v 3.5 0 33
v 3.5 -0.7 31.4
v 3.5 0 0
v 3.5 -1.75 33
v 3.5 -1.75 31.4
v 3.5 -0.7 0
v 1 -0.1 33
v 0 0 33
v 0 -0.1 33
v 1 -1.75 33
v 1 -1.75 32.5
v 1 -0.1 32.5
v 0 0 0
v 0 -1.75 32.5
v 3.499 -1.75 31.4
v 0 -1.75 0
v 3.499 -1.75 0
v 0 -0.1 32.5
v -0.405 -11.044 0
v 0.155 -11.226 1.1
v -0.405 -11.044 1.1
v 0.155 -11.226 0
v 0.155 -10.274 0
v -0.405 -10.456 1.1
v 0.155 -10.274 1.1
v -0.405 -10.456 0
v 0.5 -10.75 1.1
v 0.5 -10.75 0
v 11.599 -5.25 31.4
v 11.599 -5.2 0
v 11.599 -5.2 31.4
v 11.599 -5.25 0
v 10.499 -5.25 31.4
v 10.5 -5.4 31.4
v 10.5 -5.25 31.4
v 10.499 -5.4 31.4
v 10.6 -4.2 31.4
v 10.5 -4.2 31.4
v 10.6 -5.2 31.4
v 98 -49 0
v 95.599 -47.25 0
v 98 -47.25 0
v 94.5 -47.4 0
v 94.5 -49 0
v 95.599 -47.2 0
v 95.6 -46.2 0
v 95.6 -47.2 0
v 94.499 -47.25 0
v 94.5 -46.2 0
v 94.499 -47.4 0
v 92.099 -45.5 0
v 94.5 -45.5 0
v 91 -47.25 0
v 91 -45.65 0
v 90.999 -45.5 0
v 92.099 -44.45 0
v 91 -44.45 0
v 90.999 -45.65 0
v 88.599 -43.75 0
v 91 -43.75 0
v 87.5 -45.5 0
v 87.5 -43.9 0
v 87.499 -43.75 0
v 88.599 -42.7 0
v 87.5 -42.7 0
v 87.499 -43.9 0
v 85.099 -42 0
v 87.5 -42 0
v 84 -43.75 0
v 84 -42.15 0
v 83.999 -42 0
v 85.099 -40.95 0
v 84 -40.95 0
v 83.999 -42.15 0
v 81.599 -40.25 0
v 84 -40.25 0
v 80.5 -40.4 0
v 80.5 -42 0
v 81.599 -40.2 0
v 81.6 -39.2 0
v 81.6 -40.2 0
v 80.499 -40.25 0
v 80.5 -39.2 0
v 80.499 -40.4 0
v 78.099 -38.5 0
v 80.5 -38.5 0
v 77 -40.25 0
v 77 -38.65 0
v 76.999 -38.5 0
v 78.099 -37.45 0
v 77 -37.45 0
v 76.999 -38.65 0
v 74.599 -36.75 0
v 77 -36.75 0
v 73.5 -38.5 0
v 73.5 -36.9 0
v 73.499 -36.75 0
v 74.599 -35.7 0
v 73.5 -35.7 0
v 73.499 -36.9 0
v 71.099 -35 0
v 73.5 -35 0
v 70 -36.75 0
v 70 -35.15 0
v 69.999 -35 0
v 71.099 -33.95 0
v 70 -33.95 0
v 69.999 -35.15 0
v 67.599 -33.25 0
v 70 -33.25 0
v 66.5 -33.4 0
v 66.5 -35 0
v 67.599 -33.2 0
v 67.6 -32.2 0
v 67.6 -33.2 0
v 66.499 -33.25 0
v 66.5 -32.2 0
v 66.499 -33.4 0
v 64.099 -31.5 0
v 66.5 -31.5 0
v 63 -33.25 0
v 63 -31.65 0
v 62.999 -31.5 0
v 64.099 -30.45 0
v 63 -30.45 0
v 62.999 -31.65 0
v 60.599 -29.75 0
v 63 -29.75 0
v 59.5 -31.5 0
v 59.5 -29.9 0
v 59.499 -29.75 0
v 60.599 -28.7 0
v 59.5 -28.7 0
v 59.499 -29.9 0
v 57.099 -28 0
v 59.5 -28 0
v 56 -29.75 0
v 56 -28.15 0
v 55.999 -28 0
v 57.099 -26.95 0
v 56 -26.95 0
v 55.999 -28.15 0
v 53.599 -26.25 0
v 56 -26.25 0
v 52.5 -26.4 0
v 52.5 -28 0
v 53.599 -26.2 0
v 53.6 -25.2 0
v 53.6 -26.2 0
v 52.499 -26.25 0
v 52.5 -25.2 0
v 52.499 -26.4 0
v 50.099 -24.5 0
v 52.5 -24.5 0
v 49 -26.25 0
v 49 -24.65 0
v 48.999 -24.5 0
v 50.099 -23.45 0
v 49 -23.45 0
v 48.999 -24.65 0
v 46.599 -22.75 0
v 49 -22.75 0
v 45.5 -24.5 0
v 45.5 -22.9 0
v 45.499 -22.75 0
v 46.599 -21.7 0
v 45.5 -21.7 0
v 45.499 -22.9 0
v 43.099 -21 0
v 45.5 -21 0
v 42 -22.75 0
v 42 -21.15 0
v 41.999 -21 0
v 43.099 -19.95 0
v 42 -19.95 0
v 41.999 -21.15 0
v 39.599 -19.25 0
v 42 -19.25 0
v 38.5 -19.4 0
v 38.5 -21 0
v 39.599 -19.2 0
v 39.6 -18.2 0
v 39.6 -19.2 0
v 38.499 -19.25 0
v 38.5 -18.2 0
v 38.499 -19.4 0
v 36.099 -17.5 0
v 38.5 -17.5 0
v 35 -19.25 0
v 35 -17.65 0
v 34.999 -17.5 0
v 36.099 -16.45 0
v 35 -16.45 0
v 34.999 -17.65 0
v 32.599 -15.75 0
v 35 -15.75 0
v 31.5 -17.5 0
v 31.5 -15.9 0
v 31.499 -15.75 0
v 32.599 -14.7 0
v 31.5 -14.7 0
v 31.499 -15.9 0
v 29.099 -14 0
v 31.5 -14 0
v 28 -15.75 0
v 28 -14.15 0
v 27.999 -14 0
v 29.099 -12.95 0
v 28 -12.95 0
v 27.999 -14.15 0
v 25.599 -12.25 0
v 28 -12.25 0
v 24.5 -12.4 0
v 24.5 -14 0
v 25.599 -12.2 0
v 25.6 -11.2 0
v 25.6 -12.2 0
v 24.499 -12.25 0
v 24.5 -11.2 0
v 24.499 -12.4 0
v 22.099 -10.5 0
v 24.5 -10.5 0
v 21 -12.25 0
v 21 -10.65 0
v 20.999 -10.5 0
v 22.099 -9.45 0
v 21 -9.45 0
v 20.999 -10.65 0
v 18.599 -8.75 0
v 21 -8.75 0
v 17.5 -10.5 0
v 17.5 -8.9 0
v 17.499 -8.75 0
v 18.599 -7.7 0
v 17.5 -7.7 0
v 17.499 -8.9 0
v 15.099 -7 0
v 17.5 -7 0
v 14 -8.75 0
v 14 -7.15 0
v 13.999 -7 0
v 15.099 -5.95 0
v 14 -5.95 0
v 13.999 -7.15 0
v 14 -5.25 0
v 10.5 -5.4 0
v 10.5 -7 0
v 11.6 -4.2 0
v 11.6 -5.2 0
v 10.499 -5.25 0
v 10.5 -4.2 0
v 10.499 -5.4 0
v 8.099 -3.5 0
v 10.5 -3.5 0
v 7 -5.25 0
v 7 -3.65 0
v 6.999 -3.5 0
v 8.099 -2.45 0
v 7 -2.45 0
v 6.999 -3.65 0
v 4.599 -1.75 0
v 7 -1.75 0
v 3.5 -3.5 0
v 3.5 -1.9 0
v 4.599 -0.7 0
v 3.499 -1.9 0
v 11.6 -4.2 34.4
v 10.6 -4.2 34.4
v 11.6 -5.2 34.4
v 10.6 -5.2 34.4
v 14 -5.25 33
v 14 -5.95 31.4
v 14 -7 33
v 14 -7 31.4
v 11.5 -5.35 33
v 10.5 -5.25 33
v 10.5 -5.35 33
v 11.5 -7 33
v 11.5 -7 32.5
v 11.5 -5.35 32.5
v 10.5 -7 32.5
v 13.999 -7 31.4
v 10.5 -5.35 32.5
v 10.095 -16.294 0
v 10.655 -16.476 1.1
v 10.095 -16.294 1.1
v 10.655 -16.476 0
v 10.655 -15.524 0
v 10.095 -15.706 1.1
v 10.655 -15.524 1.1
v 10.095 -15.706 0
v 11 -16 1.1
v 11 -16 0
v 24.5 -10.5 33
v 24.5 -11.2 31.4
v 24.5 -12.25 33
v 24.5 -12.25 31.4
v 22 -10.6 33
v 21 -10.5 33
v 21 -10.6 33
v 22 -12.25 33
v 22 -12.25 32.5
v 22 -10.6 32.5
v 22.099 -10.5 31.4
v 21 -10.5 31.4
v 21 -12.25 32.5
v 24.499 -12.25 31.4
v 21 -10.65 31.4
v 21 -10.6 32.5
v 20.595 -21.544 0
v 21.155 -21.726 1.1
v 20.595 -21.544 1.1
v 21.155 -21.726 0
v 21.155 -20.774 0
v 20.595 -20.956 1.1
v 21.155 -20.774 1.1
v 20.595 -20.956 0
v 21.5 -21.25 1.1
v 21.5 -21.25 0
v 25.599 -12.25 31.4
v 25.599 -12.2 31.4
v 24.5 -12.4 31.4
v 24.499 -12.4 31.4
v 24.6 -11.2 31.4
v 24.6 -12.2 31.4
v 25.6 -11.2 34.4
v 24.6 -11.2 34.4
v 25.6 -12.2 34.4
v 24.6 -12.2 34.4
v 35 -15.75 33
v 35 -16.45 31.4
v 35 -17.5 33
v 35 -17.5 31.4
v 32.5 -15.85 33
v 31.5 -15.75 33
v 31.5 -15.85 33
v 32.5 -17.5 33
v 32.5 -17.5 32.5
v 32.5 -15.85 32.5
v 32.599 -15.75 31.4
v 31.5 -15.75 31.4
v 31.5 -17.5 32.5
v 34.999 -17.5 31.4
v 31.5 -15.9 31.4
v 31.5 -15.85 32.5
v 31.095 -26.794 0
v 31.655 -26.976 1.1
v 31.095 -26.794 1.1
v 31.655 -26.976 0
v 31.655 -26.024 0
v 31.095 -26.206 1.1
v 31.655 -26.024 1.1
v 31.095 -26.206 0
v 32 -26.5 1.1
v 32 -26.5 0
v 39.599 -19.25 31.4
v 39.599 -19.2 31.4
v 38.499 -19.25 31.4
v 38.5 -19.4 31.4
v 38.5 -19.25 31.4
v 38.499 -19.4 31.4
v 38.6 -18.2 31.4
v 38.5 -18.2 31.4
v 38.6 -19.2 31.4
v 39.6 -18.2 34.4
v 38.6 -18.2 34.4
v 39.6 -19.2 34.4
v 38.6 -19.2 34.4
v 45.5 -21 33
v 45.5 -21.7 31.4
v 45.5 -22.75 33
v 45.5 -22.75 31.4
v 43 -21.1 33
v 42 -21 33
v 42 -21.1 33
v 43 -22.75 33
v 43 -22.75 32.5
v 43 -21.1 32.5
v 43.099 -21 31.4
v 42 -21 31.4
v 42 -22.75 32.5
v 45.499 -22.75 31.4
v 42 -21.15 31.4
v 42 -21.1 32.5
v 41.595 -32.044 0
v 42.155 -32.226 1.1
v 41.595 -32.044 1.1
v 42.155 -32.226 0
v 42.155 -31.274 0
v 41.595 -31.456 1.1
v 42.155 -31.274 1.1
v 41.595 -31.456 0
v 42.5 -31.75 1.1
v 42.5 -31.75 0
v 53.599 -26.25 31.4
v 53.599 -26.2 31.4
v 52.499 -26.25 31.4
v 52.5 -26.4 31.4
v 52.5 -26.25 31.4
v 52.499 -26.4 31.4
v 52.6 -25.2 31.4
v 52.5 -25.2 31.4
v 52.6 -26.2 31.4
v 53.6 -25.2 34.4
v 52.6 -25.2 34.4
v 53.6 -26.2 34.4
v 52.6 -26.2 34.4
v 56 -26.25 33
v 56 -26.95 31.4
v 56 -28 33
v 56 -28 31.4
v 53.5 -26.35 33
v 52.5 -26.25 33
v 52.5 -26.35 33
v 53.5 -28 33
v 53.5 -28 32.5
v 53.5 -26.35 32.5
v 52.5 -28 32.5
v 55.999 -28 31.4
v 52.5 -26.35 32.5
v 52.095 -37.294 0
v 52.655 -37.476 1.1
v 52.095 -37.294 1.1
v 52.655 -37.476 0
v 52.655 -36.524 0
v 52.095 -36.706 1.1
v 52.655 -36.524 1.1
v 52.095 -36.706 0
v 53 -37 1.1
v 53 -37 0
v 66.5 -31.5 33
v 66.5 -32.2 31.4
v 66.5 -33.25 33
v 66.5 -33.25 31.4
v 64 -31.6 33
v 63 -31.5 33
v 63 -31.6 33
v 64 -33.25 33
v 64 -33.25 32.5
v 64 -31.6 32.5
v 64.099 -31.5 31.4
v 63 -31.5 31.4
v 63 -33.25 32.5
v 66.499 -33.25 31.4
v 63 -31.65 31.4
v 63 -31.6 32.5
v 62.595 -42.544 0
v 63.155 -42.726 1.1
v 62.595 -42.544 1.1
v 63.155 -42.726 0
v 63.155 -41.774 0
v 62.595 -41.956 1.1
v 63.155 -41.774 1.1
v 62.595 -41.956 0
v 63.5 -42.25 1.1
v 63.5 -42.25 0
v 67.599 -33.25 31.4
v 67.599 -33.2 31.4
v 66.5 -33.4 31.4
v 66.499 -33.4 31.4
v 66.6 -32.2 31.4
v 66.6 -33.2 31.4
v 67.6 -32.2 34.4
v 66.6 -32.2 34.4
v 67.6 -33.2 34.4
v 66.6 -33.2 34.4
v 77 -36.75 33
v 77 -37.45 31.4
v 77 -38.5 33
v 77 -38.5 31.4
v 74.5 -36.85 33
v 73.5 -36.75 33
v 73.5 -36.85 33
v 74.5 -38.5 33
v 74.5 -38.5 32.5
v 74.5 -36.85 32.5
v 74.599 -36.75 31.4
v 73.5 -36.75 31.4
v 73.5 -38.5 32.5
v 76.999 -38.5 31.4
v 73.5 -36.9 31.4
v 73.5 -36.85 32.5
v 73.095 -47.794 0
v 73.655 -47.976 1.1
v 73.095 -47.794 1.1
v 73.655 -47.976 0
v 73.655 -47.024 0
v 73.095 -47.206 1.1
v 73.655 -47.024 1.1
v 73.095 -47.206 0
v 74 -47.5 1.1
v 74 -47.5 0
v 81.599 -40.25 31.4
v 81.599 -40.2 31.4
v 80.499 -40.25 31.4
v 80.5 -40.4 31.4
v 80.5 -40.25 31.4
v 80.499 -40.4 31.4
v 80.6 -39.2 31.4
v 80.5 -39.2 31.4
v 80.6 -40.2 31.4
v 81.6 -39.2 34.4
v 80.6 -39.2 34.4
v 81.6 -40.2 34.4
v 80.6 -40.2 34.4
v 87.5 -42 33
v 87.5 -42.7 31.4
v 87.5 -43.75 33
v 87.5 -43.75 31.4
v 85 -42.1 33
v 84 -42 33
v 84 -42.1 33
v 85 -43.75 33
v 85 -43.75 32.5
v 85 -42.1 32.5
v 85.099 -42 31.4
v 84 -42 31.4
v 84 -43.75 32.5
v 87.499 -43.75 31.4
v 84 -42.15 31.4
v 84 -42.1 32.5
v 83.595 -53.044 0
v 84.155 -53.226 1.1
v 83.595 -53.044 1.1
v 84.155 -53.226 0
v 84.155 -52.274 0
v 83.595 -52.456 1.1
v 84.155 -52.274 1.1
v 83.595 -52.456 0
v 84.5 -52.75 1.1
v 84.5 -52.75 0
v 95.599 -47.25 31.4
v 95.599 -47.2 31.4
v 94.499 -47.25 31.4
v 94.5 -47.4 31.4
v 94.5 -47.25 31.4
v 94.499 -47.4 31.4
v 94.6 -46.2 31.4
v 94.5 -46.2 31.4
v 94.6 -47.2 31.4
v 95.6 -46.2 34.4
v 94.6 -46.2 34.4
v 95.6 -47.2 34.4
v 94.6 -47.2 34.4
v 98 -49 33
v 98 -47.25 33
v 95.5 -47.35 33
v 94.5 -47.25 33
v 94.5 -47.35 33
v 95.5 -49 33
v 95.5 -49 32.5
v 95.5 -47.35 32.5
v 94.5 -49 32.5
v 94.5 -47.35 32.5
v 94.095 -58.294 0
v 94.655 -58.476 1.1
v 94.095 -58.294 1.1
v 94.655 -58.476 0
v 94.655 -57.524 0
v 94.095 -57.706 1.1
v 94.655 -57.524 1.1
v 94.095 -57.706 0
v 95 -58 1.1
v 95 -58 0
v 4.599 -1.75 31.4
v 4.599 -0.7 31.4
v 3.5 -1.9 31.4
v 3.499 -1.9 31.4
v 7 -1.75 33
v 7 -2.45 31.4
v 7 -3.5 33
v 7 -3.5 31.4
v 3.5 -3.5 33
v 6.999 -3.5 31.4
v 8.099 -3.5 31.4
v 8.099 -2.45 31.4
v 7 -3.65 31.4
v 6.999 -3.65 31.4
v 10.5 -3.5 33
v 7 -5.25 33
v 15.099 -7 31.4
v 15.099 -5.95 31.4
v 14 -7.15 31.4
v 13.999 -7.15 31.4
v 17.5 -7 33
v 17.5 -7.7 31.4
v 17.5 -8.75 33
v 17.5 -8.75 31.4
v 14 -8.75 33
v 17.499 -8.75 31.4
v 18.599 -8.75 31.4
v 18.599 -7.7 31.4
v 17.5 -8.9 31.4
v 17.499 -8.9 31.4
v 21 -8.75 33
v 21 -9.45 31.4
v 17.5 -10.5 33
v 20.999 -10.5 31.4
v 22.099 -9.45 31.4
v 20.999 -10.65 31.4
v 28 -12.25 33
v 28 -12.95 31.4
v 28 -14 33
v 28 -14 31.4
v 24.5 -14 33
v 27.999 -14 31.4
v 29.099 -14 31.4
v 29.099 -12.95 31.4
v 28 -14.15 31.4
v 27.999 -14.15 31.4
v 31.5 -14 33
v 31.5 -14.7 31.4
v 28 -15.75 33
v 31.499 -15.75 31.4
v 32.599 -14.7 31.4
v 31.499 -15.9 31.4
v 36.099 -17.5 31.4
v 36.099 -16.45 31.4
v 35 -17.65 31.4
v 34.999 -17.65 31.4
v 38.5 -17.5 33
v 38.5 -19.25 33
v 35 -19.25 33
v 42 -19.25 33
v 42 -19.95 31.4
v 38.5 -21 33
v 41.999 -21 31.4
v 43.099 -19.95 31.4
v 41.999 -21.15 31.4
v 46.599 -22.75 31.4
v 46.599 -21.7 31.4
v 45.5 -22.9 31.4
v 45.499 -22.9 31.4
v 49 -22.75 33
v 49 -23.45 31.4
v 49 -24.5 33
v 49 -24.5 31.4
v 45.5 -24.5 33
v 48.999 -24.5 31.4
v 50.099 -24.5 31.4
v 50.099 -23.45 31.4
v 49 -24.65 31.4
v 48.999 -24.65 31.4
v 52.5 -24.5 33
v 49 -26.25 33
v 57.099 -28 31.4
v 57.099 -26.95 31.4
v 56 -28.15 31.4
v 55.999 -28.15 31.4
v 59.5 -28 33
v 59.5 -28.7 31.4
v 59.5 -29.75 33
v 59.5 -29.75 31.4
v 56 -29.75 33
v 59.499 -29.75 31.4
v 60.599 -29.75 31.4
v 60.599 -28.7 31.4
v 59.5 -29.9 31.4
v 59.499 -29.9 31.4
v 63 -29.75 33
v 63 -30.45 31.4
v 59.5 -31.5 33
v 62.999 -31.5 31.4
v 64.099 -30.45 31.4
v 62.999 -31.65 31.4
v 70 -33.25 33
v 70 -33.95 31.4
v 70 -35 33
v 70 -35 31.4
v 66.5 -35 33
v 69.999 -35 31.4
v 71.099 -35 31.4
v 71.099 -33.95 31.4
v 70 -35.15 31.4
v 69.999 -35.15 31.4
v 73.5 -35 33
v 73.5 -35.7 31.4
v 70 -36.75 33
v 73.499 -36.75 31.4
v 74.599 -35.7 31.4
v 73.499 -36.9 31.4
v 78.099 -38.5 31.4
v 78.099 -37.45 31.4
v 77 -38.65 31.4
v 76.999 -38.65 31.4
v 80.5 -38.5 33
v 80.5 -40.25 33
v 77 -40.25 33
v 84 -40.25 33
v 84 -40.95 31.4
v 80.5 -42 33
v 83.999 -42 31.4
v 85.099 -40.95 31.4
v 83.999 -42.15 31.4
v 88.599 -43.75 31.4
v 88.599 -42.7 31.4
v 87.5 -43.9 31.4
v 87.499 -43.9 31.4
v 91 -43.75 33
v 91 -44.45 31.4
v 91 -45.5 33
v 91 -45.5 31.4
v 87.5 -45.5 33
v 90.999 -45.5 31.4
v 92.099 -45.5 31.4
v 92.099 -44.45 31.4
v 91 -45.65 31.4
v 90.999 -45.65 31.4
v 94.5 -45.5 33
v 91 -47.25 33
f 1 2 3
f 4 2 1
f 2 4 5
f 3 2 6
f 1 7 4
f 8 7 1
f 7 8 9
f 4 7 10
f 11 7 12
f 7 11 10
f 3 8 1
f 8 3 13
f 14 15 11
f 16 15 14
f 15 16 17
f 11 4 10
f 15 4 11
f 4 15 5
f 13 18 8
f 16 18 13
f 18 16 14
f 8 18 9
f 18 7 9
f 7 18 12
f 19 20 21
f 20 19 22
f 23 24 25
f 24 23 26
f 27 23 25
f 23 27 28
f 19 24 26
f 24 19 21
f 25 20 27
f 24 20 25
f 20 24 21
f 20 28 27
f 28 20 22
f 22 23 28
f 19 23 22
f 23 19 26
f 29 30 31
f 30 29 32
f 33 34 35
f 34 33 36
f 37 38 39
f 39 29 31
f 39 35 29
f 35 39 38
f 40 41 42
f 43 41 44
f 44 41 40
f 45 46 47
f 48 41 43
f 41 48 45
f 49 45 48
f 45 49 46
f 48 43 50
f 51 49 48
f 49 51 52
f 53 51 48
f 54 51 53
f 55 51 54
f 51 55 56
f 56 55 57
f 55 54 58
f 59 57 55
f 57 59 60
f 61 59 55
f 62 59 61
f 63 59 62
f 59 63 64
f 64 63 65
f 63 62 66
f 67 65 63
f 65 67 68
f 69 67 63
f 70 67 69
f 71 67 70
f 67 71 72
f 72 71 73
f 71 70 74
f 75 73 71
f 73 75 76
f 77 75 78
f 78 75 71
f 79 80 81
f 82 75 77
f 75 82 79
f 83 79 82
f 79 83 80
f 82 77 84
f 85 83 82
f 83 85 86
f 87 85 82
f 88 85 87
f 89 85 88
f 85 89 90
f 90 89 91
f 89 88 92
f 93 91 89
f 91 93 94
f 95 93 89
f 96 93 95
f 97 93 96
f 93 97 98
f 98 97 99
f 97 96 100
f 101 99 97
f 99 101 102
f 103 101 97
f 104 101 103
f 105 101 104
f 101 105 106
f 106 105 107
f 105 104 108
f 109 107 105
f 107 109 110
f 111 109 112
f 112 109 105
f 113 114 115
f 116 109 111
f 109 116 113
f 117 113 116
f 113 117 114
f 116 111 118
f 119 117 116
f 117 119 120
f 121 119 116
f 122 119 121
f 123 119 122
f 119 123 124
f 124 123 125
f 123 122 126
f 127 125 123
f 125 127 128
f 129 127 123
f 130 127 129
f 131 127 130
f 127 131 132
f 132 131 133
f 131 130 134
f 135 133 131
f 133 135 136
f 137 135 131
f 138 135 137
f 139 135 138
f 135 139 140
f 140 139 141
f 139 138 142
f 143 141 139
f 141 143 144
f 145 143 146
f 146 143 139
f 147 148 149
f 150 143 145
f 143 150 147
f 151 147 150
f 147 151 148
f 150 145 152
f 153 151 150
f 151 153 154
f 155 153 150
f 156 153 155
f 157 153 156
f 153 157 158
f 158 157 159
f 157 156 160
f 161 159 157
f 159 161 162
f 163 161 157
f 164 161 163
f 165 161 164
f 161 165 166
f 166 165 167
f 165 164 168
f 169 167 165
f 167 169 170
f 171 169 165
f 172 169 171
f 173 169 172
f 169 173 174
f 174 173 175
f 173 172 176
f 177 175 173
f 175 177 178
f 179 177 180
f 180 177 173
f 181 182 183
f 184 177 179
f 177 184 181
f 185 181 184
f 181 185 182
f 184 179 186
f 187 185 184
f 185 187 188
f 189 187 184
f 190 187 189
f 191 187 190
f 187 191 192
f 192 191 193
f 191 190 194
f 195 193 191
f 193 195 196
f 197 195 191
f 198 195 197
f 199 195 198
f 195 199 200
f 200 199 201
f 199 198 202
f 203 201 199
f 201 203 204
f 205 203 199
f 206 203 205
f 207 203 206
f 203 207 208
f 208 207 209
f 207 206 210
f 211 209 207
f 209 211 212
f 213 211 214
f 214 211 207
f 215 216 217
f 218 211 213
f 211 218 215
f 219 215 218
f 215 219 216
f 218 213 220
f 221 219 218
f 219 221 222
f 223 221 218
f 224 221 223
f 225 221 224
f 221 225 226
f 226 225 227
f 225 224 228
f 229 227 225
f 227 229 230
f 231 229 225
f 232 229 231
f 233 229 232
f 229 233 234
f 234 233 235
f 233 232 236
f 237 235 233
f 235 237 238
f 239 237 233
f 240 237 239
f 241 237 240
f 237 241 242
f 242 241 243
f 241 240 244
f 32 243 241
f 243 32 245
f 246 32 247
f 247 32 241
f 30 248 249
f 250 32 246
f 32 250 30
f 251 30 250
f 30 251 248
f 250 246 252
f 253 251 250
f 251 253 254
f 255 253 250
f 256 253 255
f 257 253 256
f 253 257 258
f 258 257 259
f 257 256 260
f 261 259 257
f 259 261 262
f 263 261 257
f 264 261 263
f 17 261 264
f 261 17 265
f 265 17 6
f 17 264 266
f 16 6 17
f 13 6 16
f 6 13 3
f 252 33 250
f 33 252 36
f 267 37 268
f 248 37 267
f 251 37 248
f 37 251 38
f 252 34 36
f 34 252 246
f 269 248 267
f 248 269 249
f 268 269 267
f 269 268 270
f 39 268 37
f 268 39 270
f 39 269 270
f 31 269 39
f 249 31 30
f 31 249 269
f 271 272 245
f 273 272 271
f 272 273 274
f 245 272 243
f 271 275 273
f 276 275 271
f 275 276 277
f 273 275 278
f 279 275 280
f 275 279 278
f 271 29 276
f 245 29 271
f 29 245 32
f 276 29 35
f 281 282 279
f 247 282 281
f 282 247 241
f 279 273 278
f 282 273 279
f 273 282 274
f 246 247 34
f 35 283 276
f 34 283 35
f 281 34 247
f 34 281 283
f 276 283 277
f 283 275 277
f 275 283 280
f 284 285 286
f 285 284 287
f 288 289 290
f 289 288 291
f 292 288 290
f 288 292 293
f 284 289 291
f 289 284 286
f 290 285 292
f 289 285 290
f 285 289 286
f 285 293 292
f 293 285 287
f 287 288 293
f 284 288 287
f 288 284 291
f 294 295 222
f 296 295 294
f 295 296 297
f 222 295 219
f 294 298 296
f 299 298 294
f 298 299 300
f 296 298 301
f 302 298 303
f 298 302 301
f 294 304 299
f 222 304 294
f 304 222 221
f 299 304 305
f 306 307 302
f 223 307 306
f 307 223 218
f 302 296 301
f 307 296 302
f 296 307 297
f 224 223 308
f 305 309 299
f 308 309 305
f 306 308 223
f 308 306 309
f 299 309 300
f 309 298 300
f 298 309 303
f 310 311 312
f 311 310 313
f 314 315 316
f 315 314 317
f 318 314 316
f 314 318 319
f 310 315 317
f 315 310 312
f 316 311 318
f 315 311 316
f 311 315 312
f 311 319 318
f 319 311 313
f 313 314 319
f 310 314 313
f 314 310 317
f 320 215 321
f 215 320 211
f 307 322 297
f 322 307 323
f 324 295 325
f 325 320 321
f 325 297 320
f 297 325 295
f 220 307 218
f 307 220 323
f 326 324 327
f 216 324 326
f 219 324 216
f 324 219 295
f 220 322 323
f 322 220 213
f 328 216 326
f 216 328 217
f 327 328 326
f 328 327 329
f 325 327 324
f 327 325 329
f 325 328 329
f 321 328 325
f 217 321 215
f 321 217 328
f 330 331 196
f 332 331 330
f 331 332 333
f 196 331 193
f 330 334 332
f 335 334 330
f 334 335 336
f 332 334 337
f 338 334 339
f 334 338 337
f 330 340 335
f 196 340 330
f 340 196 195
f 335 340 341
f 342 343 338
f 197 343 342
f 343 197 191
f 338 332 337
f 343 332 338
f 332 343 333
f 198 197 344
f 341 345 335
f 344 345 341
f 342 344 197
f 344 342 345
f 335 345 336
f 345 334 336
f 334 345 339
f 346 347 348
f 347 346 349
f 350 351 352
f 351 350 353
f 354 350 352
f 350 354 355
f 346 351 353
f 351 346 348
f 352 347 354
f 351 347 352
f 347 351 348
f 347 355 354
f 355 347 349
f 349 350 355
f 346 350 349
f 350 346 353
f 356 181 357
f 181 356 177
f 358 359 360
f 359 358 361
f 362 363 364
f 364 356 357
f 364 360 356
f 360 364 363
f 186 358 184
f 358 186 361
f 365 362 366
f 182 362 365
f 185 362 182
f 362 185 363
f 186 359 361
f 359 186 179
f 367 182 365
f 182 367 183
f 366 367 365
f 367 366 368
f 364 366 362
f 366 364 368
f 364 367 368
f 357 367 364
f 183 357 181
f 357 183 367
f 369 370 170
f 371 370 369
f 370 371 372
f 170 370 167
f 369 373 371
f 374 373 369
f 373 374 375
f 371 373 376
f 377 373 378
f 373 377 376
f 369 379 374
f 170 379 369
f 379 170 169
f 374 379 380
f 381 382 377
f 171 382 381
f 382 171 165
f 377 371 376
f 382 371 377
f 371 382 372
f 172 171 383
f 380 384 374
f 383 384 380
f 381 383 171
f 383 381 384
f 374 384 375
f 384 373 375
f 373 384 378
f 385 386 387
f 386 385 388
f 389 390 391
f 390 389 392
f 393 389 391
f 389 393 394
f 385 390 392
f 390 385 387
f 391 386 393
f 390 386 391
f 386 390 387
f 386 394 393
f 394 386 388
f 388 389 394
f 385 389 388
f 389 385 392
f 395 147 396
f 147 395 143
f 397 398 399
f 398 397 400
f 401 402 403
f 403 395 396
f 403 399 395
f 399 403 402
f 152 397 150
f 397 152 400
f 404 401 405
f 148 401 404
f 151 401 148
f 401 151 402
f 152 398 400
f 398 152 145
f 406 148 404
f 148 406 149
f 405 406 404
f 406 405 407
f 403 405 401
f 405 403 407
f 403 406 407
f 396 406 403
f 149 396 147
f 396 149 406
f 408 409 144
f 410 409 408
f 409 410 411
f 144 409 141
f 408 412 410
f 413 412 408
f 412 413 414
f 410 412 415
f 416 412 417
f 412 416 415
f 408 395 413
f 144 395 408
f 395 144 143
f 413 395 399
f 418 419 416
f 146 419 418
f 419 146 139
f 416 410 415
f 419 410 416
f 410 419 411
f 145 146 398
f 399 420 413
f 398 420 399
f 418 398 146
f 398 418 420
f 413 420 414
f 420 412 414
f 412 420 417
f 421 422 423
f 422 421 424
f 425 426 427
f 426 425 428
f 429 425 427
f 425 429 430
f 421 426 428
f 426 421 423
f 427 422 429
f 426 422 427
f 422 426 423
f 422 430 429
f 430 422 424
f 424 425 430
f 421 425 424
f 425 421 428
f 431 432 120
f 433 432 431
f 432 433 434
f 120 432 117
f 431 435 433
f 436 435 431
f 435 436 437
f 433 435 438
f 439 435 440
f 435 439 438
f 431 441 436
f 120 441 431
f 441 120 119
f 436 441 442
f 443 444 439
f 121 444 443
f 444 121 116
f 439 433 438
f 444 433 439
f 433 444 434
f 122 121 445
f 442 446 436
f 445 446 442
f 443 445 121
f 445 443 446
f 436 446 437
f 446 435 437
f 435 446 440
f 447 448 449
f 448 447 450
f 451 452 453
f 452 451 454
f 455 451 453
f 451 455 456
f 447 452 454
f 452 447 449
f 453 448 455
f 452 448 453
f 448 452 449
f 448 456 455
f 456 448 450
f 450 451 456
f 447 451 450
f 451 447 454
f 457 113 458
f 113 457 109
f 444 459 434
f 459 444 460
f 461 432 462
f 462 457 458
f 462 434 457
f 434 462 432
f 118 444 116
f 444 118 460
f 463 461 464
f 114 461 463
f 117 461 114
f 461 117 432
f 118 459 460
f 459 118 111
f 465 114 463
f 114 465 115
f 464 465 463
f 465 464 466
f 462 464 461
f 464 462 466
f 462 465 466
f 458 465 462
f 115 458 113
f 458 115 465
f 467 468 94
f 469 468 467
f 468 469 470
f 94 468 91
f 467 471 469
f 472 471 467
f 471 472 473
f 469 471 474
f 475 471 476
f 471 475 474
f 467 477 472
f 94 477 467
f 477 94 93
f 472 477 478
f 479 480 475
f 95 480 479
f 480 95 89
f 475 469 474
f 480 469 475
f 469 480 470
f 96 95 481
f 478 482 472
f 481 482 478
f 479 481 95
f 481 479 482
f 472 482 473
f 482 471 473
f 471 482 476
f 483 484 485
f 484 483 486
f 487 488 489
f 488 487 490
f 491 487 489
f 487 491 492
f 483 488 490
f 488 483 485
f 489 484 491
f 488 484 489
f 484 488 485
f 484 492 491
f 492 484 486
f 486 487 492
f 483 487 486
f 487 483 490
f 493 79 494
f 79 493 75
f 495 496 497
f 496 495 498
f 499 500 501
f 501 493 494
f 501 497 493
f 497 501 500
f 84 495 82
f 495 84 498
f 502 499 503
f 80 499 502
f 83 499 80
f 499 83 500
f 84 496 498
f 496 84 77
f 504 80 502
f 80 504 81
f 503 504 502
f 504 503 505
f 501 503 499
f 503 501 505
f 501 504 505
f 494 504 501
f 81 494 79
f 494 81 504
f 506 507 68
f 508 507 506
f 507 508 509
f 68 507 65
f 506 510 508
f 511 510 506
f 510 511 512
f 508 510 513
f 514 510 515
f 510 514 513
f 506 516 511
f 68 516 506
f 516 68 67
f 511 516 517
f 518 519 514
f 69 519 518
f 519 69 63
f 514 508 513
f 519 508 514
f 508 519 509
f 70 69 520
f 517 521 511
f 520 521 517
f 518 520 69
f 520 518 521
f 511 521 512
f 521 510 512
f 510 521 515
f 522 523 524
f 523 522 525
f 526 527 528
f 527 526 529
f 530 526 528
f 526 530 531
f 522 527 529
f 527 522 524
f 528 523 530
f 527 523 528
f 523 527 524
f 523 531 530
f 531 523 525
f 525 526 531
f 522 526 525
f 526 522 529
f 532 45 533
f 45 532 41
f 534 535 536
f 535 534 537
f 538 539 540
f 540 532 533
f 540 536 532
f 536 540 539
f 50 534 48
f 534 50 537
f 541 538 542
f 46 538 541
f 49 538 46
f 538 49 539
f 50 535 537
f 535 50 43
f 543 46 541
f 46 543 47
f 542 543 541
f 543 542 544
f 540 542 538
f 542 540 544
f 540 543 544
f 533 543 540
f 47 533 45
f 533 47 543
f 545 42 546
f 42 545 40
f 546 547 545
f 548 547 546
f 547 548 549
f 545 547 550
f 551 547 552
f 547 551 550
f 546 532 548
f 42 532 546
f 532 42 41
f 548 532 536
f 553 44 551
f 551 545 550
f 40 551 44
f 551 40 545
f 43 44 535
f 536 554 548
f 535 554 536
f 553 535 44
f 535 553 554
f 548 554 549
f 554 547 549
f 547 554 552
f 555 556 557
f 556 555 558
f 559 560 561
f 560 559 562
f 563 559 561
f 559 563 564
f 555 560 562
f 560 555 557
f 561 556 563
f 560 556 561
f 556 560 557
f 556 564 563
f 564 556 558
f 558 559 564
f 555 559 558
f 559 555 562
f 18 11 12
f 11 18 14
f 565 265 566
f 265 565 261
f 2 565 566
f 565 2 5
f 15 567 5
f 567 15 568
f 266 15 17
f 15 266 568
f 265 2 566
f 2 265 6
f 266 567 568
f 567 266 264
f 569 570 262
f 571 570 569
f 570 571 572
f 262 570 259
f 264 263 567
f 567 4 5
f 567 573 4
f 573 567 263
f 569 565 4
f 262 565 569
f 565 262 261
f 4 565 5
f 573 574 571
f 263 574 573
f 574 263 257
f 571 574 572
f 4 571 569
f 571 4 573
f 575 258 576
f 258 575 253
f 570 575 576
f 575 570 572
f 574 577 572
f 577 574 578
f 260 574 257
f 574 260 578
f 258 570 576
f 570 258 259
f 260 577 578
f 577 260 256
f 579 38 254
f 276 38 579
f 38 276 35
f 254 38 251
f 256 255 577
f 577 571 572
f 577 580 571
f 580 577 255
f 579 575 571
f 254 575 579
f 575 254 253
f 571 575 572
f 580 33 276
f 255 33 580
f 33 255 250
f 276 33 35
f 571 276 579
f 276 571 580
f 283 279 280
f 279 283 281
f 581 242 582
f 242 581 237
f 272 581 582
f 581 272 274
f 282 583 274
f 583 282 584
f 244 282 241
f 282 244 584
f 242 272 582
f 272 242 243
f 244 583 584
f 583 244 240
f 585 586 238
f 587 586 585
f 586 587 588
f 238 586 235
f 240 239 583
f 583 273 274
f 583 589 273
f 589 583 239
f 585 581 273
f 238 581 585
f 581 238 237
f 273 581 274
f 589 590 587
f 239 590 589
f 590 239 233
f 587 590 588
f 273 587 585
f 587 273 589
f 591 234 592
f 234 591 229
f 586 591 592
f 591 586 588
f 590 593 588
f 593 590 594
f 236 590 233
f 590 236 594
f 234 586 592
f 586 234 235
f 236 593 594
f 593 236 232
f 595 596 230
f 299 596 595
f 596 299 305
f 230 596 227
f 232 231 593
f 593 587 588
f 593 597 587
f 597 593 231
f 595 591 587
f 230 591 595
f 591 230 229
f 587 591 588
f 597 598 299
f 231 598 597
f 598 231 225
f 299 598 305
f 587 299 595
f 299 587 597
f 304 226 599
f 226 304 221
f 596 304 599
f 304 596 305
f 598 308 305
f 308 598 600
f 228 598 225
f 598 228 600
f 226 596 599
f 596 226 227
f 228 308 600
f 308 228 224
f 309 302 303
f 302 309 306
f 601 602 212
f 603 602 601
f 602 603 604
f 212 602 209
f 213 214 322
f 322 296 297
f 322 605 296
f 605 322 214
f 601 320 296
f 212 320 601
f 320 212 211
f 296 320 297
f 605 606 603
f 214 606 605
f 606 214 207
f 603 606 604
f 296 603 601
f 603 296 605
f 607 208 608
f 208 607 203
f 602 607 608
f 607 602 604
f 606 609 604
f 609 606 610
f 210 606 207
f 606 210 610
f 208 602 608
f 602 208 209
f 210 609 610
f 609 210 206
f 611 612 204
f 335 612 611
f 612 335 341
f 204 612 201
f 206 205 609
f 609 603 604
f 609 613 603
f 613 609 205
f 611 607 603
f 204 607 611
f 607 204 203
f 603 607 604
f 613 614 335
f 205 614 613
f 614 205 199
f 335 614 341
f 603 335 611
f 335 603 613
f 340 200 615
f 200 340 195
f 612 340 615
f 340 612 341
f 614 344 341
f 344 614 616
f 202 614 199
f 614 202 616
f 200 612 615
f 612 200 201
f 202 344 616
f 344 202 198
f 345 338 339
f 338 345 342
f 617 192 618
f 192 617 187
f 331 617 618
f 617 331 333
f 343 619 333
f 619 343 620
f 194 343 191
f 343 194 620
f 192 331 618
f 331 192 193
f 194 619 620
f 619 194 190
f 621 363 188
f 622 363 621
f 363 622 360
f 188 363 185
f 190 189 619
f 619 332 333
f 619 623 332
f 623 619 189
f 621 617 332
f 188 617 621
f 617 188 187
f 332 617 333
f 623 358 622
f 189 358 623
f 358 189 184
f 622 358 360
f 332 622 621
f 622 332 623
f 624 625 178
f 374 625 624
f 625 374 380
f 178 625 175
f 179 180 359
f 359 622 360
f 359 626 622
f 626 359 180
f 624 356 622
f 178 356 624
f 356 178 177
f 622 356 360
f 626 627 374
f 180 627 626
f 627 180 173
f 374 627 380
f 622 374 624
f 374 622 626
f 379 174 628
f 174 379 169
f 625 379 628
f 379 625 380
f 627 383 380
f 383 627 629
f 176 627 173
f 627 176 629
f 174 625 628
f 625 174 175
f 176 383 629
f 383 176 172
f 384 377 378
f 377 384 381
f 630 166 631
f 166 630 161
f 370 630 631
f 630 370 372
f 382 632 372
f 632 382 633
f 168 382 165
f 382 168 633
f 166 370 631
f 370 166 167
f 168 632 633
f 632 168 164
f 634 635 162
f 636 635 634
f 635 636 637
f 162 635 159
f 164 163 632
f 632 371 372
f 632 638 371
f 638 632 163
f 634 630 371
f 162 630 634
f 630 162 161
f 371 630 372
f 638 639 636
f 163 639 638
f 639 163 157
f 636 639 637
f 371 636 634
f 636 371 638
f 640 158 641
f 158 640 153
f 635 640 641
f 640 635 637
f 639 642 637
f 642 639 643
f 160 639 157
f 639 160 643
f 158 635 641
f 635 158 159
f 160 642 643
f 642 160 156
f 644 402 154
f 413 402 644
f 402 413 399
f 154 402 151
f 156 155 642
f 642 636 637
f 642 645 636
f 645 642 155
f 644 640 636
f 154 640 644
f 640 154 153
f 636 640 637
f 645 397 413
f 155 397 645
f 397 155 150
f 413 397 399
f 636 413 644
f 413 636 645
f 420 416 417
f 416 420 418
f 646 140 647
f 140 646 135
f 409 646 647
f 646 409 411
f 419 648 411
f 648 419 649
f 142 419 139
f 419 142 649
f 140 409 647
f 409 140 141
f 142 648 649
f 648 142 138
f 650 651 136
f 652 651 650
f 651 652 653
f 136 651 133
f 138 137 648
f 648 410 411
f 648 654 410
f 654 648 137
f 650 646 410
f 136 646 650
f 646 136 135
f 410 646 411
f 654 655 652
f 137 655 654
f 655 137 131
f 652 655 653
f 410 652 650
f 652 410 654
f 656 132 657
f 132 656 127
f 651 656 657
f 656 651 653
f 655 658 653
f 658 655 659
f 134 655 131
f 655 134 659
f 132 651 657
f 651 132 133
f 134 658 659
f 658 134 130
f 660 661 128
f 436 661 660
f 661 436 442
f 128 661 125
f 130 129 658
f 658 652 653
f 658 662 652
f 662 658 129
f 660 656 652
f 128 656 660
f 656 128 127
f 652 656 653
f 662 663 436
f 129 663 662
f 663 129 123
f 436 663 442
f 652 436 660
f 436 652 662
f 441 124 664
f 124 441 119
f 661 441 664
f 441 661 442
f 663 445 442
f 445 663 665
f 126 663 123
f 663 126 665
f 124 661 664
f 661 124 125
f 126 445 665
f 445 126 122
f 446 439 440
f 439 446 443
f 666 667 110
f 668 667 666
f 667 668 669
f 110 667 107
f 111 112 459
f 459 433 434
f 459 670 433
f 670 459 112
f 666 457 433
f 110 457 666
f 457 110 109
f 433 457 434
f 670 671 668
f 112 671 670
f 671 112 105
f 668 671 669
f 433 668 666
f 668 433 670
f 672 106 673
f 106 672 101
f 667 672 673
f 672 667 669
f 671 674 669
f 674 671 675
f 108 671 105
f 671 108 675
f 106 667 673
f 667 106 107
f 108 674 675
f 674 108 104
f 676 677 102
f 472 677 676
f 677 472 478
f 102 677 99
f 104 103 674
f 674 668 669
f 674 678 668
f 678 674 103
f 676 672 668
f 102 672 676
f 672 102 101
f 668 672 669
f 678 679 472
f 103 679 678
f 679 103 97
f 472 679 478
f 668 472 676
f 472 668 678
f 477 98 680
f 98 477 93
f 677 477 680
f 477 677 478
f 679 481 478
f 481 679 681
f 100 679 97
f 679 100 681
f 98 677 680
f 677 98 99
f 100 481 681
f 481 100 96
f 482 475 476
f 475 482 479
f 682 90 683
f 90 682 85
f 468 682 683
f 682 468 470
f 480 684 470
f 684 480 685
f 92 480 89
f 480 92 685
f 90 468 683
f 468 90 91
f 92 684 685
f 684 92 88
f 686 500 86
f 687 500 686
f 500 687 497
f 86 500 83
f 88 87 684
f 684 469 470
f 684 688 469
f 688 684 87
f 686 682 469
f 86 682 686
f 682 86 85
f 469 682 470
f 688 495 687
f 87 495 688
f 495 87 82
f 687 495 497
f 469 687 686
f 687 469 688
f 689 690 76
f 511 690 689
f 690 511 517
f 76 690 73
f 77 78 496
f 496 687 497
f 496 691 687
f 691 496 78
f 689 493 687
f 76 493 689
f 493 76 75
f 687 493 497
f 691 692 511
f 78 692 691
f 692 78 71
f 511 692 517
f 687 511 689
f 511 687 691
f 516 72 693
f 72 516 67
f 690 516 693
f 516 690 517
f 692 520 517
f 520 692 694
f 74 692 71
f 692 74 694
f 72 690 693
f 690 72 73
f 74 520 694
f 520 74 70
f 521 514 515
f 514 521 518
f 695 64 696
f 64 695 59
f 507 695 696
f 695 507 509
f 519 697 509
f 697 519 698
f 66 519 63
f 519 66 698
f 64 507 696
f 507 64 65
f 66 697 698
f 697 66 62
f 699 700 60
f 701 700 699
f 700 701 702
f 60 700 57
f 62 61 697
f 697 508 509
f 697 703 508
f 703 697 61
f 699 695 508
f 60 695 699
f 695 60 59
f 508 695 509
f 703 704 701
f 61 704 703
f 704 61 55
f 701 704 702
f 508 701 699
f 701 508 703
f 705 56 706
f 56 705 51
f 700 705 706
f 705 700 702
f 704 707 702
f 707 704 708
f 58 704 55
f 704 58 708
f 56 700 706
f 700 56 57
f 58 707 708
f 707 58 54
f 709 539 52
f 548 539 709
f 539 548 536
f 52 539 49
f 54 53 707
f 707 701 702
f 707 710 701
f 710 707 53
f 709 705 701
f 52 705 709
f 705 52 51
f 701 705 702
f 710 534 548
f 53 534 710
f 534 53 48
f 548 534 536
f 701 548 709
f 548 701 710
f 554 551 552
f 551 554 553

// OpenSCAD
/// @file fb_mod_RHstairs.scad
///
/// @brief footbridge mod RH stairs
///
/// @author © Dave Harris 2022
/// 


module fb_mod_RHstairs
  (
      steps
    , rise
    , tread
    , width
  )
{
  for( step = [ 0 : 1 : steps ] ) 
  {
    x = (step * tread);
    y = (step * -rise) -rise;
      
    //echo("stairsRH x,y=",x,y);
      
    translate( // step
      [ x
      , y
      , 0 ]
    ) cube(
        [ tread
        , rise
        , width -0.5  ]
      ); 
      
    if(step % 3 == 0) // post hole
    {
        translate(
          [ x +1
          , y
          , width -0.6 ]
        ) cube(
            [ tread -1
            , rise
            , 0.6  ]
          );
        
      translate( // close hole
        [ x
        , y +rise -0.1
        , width -0.6 ]
      ) cube(
          [ 1.1
          , 0.1
          , 0.6 ]
        ); 
        
        translate( // side rail
          [ x
          , y -9
          , 0  ]
        ) cylinder(
              h = 1.1
            , r = 0.5
          );
    }
    else // no post hole
    {
      translate(
        [ x
        , y
        , width -0.6 ]
      ) cube(
          [ tread
          , rise
          , 0.6 ]
        ); 
    }
    
    if(step < steps) // no tab at top
    {
      translate(
        [ x +tread -0.1
        , y + rise -1
        , 0 ]
      ) cube(
          [ 1
          , 0
          , width -1.6 ]
        );
        
      translate(
        [ x + tread -0.001 
        , y + rise -1.9 
        , 0 ]
      ) cube(
          [ 1.1
          , 1.2
          , width - 1.6 ]
        );
      
      if(step % 4 == 2) // tab
      {
        translate(
          [ x +tread +0.1
          , y + rise -1.7
          , 0  ]
        ) cube(
            [ 1
            , 1
            , width +1.4  ]
          );
      }
    }
  } // end for loop
} // end module


// local test RH stairs

fb_mod_RHstairs(
    steps = 27
  , rise  = 1.75
  , tread = 3.5
  , width = 33
);

// eof
